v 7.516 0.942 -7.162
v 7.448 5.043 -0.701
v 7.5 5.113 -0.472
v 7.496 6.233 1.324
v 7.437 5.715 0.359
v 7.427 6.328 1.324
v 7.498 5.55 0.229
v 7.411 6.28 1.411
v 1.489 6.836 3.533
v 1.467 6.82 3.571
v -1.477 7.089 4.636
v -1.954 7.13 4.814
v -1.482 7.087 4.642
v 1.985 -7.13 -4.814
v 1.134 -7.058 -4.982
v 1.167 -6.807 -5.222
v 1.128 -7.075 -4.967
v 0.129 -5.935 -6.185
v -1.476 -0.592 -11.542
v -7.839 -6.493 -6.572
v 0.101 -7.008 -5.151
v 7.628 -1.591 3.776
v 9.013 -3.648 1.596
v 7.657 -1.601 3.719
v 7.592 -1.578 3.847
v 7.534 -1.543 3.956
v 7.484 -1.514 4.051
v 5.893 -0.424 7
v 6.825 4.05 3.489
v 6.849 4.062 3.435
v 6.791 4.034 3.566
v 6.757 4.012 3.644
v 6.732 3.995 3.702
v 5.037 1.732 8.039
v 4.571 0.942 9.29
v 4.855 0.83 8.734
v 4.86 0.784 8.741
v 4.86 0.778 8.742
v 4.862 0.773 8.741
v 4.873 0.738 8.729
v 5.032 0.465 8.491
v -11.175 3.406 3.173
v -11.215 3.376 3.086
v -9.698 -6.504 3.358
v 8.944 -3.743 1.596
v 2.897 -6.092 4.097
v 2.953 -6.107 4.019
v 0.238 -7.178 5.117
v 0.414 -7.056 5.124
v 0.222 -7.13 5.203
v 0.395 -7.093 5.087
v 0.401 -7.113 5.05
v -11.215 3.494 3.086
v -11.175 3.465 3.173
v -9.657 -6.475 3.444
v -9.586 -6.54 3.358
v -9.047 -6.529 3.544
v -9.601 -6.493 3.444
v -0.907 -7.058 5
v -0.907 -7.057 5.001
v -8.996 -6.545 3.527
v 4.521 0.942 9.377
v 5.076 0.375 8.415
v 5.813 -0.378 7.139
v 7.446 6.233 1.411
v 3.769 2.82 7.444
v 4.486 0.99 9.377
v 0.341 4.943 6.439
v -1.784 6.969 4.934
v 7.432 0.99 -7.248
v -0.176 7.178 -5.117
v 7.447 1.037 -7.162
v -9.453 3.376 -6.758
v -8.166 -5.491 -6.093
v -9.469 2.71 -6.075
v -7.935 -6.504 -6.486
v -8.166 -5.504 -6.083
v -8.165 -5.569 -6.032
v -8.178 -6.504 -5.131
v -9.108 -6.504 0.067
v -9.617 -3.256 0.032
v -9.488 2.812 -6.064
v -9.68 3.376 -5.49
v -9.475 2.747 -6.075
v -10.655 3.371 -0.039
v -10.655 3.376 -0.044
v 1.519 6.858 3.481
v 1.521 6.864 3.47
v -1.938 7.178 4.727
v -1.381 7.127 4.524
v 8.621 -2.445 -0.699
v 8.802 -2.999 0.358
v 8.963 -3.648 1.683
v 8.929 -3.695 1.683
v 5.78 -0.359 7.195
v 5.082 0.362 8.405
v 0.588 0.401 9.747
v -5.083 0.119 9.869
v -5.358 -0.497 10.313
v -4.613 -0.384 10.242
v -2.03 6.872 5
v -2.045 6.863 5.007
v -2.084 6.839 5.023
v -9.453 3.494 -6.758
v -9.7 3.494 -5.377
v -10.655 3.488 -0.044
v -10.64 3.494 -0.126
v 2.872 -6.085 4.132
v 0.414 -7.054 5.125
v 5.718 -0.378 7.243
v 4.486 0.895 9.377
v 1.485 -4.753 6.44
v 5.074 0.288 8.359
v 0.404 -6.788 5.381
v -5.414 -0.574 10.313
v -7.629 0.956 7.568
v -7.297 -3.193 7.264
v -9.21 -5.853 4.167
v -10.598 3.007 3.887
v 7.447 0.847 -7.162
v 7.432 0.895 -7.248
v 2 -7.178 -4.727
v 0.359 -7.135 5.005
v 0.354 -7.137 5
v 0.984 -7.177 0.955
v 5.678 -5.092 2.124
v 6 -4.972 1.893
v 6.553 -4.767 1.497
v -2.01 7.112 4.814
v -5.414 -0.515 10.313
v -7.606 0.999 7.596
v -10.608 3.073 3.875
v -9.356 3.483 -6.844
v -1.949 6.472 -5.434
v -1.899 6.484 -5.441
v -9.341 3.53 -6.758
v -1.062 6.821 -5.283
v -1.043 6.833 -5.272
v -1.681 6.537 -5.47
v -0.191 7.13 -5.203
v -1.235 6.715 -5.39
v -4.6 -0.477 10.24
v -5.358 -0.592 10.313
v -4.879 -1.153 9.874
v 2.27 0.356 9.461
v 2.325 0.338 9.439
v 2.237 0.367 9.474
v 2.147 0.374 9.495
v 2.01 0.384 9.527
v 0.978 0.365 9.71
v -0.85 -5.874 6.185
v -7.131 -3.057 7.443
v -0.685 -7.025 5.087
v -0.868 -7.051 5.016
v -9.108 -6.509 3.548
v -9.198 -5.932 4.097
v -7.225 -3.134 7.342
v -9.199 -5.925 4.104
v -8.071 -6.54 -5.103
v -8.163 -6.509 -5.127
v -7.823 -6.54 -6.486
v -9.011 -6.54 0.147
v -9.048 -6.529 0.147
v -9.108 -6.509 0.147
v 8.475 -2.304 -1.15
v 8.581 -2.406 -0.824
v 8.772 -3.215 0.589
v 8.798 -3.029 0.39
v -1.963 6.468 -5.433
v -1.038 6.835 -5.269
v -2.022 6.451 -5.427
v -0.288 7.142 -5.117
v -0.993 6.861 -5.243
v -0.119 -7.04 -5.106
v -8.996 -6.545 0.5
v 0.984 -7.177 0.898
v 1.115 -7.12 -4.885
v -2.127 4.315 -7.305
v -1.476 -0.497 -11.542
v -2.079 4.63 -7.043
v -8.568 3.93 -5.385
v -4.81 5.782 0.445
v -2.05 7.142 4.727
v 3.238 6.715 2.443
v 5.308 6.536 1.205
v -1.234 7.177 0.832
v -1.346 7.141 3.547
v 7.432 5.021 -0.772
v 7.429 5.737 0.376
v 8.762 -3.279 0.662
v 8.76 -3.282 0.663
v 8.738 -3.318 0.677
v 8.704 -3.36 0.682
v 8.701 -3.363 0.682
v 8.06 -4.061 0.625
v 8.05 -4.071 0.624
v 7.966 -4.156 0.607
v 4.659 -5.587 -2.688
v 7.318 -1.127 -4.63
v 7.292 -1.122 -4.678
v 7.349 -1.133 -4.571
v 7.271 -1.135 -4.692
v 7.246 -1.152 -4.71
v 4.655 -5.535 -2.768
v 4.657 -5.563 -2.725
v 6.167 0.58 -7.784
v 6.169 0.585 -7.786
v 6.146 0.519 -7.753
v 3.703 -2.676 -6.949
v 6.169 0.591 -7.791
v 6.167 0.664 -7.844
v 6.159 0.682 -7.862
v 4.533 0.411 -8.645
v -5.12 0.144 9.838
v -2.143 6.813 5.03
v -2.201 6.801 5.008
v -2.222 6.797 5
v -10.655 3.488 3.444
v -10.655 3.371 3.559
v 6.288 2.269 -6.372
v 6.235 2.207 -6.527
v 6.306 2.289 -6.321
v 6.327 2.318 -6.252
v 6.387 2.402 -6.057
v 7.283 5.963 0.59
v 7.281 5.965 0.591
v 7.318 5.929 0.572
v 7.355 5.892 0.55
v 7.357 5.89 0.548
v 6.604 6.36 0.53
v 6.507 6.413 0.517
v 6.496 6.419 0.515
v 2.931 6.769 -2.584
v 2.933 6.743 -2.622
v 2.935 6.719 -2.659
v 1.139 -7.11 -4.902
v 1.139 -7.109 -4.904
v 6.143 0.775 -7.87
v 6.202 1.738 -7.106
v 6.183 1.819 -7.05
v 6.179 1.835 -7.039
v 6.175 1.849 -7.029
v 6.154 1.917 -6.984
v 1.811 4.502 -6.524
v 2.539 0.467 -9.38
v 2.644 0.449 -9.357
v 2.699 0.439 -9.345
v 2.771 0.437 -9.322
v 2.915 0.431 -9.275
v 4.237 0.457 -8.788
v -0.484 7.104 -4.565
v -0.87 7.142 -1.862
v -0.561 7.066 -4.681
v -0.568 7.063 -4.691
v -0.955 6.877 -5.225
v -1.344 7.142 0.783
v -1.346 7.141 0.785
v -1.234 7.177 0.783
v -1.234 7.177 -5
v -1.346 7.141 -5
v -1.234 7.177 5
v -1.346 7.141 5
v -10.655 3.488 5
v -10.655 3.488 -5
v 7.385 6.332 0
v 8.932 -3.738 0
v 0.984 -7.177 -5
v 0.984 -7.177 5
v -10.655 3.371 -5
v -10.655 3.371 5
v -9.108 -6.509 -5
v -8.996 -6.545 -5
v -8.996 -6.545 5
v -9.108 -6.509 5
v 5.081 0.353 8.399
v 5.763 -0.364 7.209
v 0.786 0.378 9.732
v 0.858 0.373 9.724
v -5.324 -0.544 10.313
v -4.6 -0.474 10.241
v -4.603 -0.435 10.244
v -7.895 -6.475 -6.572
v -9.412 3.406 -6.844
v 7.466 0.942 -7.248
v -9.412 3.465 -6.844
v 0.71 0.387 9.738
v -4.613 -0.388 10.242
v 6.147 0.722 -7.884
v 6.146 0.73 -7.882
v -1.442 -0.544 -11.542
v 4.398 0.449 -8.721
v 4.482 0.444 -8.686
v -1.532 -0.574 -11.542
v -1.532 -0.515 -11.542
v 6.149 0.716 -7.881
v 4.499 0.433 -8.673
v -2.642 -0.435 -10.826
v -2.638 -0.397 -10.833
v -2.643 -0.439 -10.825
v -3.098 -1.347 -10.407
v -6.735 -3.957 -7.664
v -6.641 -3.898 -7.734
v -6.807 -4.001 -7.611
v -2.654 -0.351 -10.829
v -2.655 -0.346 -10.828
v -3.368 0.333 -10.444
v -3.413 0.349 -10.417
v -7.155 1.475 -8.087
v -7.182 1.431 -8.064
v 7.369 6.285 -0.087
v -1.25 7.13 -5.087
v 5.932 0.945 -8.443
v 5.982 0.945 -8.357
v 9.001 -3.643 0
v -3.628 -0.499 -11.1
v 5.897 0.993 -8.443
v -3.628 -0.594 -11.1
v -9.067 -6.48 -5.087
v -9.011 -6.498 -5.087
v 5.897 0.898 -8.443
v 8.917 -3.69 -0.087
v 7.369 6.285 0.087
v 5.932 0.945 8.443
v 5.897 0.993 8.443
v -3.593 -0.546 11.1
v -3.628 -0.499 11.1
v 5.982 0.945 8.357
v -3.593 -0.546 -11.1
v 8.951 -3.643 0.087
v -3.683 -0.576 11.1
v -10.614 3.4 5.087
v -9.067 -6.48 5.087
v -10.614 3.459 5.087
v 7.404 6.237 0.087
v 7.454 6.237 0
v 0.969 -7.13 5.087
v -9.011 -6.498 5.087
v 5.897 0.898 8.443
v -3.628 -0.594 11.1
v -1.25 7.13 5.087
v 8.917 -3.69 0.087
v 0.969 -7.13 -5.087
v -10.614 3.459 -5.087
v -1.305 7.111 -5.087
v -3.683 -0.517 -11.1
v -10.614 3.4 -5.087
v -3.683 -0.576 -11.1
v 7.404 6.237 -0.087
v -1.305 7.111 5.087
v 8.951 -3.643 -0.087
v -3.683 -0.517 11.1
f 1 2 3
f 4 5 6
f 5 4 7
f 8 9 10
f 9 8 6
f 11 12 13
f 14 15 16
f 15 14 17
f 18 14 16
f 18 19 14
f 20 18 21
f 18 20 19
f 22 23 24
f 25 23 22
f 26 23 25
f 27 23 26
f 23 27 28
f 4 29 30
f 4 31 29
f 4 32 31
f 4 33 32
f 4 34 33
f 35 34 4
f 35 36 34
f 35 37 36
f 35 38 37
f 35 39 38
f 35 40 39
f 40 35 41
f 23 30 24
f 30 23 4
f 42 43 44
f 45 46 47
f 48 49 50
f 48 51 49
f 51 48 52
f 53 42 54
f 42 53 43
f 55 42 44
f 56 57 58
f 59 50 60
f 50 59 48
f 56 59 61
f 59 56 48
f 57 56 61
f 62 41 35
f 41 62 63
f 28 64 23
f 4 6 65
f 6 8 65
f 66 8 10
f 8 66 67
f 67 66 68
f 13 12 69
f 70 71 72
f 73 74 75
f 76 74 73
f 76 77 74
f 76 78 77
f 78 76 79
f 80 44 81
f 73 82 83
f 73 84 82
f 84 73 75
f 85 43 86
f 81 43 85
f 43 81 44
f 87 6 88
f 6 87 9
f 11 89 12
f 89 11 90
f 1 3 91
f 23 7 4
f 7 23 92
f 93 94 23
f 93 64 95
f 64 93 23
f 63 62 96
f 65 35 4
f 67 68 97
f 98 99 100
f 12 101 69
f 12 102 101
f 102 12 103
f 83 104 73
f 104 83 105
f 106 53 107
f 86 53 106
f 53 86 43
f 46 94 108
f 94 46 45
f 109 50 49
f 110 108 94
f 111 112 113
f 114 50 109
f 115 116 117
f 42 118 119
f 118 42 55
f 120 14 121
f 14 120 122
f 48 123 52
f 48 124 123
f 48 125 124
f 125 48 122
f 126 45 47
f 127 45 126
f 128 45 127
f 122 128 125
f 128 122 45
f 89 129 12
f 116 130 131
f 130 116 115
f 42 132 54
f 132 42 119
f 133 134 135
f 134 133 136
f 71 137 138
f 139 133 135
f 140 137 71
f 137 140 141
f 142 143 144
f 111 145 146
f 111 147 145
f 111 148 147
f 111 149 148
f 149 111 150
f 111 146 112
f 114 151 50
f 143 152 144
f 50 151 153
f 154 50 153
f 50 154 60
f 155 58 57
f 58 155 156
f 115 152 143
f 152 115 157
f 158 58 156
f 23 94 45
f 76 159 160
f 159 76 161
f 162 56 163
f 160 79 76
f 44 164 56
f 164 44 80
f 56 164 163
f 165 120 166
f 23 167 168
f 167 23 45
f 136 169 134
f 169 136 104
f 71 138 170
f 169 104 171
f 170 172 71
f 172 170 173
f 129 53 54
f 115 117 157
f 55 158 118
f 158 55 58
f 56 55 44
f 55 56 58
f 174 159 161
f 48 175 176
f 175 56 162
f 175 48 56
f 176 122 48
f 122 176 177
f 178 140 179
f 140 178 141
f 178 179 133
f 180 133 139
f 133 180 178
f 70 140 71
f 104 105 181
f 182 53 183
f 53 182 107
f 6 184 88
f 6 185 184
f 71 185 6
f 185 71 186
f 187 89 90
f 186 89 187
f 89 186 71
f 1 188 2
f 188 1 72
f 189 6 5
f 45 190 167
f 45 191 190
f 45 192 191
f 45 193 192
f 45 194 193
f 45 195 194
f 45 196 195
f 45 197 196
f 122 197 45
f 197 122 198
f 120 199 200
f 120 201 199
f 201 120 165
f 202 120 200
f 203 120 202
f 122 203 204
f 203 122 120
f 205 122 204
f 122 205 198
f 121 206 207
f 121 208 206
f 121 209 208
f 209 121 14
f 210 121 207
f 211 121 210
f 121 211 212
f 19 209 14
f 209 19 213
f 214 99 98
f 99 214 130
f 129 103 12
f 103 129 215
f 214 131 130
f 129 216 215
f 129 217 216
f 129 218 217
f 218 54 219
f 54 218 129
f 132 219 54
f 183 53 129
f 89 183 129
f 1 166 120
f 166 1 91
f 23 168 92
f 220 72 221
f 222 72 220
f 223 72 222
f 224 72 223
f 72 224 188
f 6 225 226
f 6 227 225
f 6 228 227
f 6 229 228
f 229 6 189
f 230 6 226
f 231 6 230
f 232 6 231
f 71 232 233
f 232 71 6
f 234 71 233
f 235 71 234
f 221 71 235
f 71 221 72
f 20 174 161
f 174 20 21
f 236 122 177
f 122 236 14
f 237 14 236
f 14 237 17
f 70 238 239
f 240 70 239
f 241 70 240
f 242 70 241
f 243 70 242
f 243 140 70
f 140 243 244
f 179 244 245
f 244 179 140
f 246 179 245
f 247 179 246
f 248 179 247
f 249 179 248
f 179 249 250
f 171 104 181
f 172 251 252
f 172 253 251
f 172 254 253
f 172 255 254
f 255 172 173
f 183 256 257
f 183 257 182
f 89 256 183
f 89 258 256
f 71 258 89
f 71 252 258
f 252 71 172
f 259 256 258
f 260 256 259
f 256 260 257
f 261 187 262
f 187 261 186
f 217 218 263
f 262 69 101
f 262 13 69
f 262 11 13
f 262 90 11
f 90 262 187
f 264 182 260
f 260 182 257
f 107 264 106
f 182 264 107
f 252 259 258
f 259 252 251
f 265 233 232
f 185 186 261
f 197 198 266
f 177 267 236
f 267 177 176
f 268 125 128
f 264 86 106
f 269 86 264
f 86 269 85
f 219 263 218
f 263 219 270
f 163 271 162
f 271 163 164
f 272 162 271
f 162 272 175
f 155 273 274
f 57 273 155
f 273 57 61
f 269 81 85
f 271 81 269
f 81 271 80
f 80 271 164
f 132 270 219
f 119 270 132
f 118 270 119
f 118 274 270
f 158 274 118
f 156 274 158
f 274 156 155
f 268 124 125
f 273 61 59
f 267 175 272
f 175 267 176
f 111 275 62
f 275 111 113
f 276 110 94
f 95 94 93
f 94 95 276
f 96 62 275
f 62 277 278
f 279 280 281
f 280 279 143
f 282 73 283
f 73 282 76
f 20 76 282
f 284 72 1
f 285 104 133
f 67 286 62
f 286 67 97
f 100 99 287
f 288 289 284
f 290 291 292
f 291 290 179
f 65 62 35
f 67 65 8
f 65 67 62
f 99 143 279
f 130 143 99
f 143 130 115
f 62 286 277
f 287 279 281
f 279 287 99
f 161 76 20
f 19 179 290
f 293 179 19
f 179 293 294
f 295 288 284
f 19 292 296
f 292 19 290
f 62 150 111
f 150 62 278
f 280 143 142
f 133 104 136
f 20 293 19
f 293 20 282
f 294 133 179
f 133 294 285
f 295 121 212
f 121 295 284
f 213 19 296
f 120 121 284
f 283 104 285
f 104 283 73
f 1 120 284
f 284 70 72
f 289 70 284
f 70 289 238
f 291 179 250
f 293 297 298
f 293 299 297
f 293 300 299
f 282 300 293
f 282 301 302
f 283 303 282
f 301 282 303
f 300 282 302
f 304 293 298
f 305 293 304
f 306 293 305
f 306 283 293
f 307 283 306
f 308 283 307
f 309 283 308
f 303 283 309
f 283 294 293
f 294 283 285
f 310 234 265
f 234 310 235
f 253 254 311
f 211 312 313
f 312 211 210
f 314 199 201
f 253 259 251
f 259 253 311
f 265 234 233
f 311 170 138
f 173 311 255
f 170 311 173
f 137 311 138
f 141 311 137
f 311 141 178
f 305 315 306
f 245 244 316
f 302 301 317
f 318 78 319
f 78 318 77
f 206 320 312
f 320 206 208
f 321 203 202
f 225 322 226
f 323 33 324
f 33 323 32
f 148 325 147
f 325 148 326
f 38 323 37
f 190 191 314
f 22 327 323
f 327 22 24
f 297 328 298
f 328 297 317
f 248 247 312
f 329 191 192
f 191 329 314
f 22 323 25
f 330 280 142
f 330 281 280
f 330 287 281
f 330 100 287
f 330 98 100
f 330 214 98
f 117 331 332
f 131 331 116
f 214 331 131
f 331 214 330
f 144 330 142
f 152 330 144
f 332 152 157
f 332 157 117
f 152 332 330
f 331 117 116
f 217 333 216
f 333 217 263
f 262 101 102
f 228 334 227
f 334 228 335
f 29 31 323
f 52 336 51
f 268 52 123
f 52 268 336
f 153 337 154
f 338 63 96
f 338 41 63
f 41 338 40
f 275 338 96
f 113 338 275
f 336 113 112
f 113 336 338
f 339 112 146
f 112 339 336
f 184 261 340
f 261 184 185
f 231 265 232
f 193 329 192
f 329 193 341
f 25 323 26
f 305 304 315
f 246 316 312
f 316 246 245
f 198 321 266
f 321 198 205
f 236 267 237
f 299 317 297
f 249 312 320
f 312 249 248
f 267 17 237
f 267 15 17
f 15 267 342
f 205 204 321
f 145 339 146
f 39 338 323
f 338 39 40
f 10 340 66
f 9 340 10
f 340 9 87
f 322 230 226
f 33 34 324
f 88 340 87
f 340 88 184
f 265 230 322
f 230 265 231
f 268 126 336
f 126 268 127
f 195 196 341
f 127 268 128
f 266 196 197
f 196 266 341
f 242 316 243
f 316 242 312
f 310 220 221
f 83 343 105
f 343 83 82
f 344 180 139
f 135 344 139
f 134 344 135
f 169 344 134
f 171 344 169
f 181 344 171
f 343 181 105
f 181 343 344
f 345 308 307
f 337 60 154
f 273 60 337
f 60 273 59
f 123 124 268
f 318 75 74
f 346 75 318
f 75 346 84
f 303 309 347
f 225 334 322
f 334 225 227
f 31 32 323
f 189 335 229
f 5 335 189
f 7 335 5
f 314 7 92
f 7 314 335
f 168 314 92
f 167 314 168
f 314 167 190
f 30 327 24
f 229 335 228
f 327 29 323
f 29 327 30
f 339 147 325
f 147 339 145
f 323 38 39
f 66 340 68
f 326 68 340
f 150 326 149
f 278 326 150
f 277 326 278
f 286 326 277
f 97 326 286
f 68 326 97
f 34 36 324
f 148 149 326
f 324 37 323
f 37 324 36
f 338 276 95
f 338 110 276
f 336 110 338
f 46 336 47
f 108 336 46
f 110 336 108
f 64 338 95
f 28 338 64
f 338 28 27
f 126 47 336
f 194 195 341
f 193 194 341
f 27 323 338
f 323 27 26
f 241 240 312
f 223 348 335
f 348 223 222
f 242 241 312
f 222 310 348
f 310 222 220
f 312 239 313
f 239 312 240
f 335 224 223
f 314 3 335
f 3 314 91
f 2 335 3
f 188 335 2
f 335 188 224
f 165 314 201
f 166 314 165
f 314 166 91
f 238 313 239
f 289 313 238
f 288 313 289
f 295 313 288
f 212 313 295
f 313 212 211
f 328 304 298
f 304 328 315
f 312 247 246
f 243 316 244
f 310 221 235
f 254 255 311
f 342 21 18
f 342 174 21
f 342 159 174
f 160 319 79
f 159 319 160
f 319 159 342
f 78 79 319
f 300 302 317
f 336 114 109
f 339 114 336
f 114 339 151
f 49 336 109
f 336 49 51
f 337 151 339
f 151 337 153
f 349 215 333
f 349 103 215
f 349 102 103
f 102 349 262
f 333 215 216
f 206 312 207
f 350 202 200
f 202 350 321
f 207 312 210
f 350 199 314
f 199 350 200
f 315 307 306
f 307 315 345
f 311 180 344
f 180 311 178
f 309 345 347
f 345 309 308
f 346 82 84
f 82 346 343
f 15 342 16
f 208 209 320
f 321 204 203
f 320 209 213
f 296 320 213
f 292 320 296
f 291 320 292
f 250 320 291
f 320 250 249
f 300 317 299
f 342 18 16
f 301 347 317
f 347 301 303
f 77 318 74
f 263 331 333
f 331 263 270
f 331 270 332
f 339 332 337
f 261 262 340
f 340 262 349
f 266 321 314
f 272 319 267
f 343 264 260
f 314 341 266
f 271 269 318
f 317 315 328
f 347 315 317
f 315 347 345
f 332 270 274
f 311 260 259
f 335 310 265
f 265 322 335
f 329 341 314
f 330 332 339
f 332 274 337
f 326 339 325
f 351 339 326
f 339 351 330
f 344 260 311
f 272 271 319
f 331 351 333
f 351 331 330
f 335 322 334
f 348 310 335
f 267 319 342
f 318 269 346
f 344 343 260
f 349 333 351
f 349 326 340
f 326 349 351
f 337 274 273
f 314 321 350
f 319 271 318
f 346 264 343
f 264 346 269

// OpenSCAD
// Auto-generated OpenSCAD file

    inner_points = 10*[[0.09531931272834022, -0.708217768074746, 0.49999999999998035], [-0.1265027432556592, 0.7082076393294248, 0.5000000000000197], [0.09531931272830348, -0.7082177680747239, -0.5000000000000197], [-0.12650274325569594, 0.7082076393294469, -0.49999999999998035], [-0.9026819541698768, -0.6450238500956094, 0.5000000000000183], [-1.057403067527742, 0.34293433580159893, 0.5000000000000459], [-0.9026819541699135, -0.6450238500955873, -0.4999999999999816], [-1.0574030675277786, 0.3429343358016208, -0.4999999999999542], [-0.36429558422672353, -0.054614512027756246, 1.1012960420472895], [-0.36429558422680436, -0.054614512027707784, -1.1012960420472664], [0.5881683563647194, 0.09454795600494201, 0.8356590717223468], [0.5881683563646581, 0.09454795600497881, -0.835659071722387], [0.8901105540161008, -0.36426009223040756, -4.1278652498751285e-14], [0.7353894406582356, 0.6236980936668005, -1.3844723451608184e-14]];

    outer_points = 10*[[-0.02066955875502509, 0.7082734695712609, -0.5116521782007974], [0.19691489843267096, -0.7082734695712609, -0.47269409229648607], [-0.19691489843267096, 0.7082734695712609, 0.47269409229648607], [0.02066955875502509, -0.7082734695712609, 0.5116521782007974], [-0.9371950219503415, 0.34351113745696893, -0.6757543304875785], [-0.7854296381335247, -0.6445318169533729, -0.6485810252963166], [-1.1134403616279873, 0.34351113745696893, 0.308591940009705], [-0.9616749778111705, -0.6445318169533729, 0.33576524520096696], [-0.14917650894770007, -0.05441805639996789, -1.145519356688417], [-0.537373098980239, -0.05441805639996789, 1.022593946716898], [0.7416409844661176, 0.09422163776851929, -0.7161588615966802], [0.4470789505652881, 0.09422163776851929, 0.9289969197175875], [0.7395623441727243, 0.6232908947450454, 0.13241724022144047], [0.891327727989541, -0.36475205966529645, 0.15959054541270243]];

    // Convex hull for inner set (I)
    module inner_hull() {
        hull() {
            for (p = inner_points) {
                translate(p) sphere(r=0.1);
            }
        }
    }

    // Convex hull for outer set (O) minus inner hull (O \ I)
    module outer_minus_inner() {
        difference() {
            hull() {
                for (p = outer_points) {
                    translate(p) sphere(r=0.1);
                }
            }
            inner_hull(); // Subtract inner hull
        }
    }

    // Convex hull for outer set (O) minus all translated inner hulls
    module outer_minus_AllTranslationInner() {
        difference() {
            hull() {
                for (p = outer_points) {
                    translate(p) sphere(r=0.1);
                }
            }
            hull() {
                translate([0,0,50]) inner_hull();
                translate([0,0,-50]) inner_hull();
            }; // Subtract translated inner hulls
        }
    }

    // Difference between outer_minus_inner and outer_minus_AllTranslationInner
    module outer_minus_inner_diff() {
        difference() {
            // Outer minus inner
            difference() {
                hull() {
                    for (p = outer_points) {
                        translate(p) sphere(r=0.1);
                    }
                }
                inner_hull();
            }

            // Subtract Outer minus AllTranslationInner
            difference() {
                hull() {
                    for (p = outer_points) {
                        translate(p) sphere(r=0.1);
                    }
                }
                hull() {
                    translate([0,0,50]) inner_hull();
                    translate([0,0,-50]) inner_hull();
                };
            }
        }
    }

    // Rendering all with colors applied
    color([1, 0, 0, 0.5]) inner_hull(); // Transparent red
    color([0, 1, 0, 1]) outer_minus_AllTranslationInner(); // Opaque green
    color([1, 1, 0, 1]) outer_minus_inner_diff(); // Opaque yellow
    
